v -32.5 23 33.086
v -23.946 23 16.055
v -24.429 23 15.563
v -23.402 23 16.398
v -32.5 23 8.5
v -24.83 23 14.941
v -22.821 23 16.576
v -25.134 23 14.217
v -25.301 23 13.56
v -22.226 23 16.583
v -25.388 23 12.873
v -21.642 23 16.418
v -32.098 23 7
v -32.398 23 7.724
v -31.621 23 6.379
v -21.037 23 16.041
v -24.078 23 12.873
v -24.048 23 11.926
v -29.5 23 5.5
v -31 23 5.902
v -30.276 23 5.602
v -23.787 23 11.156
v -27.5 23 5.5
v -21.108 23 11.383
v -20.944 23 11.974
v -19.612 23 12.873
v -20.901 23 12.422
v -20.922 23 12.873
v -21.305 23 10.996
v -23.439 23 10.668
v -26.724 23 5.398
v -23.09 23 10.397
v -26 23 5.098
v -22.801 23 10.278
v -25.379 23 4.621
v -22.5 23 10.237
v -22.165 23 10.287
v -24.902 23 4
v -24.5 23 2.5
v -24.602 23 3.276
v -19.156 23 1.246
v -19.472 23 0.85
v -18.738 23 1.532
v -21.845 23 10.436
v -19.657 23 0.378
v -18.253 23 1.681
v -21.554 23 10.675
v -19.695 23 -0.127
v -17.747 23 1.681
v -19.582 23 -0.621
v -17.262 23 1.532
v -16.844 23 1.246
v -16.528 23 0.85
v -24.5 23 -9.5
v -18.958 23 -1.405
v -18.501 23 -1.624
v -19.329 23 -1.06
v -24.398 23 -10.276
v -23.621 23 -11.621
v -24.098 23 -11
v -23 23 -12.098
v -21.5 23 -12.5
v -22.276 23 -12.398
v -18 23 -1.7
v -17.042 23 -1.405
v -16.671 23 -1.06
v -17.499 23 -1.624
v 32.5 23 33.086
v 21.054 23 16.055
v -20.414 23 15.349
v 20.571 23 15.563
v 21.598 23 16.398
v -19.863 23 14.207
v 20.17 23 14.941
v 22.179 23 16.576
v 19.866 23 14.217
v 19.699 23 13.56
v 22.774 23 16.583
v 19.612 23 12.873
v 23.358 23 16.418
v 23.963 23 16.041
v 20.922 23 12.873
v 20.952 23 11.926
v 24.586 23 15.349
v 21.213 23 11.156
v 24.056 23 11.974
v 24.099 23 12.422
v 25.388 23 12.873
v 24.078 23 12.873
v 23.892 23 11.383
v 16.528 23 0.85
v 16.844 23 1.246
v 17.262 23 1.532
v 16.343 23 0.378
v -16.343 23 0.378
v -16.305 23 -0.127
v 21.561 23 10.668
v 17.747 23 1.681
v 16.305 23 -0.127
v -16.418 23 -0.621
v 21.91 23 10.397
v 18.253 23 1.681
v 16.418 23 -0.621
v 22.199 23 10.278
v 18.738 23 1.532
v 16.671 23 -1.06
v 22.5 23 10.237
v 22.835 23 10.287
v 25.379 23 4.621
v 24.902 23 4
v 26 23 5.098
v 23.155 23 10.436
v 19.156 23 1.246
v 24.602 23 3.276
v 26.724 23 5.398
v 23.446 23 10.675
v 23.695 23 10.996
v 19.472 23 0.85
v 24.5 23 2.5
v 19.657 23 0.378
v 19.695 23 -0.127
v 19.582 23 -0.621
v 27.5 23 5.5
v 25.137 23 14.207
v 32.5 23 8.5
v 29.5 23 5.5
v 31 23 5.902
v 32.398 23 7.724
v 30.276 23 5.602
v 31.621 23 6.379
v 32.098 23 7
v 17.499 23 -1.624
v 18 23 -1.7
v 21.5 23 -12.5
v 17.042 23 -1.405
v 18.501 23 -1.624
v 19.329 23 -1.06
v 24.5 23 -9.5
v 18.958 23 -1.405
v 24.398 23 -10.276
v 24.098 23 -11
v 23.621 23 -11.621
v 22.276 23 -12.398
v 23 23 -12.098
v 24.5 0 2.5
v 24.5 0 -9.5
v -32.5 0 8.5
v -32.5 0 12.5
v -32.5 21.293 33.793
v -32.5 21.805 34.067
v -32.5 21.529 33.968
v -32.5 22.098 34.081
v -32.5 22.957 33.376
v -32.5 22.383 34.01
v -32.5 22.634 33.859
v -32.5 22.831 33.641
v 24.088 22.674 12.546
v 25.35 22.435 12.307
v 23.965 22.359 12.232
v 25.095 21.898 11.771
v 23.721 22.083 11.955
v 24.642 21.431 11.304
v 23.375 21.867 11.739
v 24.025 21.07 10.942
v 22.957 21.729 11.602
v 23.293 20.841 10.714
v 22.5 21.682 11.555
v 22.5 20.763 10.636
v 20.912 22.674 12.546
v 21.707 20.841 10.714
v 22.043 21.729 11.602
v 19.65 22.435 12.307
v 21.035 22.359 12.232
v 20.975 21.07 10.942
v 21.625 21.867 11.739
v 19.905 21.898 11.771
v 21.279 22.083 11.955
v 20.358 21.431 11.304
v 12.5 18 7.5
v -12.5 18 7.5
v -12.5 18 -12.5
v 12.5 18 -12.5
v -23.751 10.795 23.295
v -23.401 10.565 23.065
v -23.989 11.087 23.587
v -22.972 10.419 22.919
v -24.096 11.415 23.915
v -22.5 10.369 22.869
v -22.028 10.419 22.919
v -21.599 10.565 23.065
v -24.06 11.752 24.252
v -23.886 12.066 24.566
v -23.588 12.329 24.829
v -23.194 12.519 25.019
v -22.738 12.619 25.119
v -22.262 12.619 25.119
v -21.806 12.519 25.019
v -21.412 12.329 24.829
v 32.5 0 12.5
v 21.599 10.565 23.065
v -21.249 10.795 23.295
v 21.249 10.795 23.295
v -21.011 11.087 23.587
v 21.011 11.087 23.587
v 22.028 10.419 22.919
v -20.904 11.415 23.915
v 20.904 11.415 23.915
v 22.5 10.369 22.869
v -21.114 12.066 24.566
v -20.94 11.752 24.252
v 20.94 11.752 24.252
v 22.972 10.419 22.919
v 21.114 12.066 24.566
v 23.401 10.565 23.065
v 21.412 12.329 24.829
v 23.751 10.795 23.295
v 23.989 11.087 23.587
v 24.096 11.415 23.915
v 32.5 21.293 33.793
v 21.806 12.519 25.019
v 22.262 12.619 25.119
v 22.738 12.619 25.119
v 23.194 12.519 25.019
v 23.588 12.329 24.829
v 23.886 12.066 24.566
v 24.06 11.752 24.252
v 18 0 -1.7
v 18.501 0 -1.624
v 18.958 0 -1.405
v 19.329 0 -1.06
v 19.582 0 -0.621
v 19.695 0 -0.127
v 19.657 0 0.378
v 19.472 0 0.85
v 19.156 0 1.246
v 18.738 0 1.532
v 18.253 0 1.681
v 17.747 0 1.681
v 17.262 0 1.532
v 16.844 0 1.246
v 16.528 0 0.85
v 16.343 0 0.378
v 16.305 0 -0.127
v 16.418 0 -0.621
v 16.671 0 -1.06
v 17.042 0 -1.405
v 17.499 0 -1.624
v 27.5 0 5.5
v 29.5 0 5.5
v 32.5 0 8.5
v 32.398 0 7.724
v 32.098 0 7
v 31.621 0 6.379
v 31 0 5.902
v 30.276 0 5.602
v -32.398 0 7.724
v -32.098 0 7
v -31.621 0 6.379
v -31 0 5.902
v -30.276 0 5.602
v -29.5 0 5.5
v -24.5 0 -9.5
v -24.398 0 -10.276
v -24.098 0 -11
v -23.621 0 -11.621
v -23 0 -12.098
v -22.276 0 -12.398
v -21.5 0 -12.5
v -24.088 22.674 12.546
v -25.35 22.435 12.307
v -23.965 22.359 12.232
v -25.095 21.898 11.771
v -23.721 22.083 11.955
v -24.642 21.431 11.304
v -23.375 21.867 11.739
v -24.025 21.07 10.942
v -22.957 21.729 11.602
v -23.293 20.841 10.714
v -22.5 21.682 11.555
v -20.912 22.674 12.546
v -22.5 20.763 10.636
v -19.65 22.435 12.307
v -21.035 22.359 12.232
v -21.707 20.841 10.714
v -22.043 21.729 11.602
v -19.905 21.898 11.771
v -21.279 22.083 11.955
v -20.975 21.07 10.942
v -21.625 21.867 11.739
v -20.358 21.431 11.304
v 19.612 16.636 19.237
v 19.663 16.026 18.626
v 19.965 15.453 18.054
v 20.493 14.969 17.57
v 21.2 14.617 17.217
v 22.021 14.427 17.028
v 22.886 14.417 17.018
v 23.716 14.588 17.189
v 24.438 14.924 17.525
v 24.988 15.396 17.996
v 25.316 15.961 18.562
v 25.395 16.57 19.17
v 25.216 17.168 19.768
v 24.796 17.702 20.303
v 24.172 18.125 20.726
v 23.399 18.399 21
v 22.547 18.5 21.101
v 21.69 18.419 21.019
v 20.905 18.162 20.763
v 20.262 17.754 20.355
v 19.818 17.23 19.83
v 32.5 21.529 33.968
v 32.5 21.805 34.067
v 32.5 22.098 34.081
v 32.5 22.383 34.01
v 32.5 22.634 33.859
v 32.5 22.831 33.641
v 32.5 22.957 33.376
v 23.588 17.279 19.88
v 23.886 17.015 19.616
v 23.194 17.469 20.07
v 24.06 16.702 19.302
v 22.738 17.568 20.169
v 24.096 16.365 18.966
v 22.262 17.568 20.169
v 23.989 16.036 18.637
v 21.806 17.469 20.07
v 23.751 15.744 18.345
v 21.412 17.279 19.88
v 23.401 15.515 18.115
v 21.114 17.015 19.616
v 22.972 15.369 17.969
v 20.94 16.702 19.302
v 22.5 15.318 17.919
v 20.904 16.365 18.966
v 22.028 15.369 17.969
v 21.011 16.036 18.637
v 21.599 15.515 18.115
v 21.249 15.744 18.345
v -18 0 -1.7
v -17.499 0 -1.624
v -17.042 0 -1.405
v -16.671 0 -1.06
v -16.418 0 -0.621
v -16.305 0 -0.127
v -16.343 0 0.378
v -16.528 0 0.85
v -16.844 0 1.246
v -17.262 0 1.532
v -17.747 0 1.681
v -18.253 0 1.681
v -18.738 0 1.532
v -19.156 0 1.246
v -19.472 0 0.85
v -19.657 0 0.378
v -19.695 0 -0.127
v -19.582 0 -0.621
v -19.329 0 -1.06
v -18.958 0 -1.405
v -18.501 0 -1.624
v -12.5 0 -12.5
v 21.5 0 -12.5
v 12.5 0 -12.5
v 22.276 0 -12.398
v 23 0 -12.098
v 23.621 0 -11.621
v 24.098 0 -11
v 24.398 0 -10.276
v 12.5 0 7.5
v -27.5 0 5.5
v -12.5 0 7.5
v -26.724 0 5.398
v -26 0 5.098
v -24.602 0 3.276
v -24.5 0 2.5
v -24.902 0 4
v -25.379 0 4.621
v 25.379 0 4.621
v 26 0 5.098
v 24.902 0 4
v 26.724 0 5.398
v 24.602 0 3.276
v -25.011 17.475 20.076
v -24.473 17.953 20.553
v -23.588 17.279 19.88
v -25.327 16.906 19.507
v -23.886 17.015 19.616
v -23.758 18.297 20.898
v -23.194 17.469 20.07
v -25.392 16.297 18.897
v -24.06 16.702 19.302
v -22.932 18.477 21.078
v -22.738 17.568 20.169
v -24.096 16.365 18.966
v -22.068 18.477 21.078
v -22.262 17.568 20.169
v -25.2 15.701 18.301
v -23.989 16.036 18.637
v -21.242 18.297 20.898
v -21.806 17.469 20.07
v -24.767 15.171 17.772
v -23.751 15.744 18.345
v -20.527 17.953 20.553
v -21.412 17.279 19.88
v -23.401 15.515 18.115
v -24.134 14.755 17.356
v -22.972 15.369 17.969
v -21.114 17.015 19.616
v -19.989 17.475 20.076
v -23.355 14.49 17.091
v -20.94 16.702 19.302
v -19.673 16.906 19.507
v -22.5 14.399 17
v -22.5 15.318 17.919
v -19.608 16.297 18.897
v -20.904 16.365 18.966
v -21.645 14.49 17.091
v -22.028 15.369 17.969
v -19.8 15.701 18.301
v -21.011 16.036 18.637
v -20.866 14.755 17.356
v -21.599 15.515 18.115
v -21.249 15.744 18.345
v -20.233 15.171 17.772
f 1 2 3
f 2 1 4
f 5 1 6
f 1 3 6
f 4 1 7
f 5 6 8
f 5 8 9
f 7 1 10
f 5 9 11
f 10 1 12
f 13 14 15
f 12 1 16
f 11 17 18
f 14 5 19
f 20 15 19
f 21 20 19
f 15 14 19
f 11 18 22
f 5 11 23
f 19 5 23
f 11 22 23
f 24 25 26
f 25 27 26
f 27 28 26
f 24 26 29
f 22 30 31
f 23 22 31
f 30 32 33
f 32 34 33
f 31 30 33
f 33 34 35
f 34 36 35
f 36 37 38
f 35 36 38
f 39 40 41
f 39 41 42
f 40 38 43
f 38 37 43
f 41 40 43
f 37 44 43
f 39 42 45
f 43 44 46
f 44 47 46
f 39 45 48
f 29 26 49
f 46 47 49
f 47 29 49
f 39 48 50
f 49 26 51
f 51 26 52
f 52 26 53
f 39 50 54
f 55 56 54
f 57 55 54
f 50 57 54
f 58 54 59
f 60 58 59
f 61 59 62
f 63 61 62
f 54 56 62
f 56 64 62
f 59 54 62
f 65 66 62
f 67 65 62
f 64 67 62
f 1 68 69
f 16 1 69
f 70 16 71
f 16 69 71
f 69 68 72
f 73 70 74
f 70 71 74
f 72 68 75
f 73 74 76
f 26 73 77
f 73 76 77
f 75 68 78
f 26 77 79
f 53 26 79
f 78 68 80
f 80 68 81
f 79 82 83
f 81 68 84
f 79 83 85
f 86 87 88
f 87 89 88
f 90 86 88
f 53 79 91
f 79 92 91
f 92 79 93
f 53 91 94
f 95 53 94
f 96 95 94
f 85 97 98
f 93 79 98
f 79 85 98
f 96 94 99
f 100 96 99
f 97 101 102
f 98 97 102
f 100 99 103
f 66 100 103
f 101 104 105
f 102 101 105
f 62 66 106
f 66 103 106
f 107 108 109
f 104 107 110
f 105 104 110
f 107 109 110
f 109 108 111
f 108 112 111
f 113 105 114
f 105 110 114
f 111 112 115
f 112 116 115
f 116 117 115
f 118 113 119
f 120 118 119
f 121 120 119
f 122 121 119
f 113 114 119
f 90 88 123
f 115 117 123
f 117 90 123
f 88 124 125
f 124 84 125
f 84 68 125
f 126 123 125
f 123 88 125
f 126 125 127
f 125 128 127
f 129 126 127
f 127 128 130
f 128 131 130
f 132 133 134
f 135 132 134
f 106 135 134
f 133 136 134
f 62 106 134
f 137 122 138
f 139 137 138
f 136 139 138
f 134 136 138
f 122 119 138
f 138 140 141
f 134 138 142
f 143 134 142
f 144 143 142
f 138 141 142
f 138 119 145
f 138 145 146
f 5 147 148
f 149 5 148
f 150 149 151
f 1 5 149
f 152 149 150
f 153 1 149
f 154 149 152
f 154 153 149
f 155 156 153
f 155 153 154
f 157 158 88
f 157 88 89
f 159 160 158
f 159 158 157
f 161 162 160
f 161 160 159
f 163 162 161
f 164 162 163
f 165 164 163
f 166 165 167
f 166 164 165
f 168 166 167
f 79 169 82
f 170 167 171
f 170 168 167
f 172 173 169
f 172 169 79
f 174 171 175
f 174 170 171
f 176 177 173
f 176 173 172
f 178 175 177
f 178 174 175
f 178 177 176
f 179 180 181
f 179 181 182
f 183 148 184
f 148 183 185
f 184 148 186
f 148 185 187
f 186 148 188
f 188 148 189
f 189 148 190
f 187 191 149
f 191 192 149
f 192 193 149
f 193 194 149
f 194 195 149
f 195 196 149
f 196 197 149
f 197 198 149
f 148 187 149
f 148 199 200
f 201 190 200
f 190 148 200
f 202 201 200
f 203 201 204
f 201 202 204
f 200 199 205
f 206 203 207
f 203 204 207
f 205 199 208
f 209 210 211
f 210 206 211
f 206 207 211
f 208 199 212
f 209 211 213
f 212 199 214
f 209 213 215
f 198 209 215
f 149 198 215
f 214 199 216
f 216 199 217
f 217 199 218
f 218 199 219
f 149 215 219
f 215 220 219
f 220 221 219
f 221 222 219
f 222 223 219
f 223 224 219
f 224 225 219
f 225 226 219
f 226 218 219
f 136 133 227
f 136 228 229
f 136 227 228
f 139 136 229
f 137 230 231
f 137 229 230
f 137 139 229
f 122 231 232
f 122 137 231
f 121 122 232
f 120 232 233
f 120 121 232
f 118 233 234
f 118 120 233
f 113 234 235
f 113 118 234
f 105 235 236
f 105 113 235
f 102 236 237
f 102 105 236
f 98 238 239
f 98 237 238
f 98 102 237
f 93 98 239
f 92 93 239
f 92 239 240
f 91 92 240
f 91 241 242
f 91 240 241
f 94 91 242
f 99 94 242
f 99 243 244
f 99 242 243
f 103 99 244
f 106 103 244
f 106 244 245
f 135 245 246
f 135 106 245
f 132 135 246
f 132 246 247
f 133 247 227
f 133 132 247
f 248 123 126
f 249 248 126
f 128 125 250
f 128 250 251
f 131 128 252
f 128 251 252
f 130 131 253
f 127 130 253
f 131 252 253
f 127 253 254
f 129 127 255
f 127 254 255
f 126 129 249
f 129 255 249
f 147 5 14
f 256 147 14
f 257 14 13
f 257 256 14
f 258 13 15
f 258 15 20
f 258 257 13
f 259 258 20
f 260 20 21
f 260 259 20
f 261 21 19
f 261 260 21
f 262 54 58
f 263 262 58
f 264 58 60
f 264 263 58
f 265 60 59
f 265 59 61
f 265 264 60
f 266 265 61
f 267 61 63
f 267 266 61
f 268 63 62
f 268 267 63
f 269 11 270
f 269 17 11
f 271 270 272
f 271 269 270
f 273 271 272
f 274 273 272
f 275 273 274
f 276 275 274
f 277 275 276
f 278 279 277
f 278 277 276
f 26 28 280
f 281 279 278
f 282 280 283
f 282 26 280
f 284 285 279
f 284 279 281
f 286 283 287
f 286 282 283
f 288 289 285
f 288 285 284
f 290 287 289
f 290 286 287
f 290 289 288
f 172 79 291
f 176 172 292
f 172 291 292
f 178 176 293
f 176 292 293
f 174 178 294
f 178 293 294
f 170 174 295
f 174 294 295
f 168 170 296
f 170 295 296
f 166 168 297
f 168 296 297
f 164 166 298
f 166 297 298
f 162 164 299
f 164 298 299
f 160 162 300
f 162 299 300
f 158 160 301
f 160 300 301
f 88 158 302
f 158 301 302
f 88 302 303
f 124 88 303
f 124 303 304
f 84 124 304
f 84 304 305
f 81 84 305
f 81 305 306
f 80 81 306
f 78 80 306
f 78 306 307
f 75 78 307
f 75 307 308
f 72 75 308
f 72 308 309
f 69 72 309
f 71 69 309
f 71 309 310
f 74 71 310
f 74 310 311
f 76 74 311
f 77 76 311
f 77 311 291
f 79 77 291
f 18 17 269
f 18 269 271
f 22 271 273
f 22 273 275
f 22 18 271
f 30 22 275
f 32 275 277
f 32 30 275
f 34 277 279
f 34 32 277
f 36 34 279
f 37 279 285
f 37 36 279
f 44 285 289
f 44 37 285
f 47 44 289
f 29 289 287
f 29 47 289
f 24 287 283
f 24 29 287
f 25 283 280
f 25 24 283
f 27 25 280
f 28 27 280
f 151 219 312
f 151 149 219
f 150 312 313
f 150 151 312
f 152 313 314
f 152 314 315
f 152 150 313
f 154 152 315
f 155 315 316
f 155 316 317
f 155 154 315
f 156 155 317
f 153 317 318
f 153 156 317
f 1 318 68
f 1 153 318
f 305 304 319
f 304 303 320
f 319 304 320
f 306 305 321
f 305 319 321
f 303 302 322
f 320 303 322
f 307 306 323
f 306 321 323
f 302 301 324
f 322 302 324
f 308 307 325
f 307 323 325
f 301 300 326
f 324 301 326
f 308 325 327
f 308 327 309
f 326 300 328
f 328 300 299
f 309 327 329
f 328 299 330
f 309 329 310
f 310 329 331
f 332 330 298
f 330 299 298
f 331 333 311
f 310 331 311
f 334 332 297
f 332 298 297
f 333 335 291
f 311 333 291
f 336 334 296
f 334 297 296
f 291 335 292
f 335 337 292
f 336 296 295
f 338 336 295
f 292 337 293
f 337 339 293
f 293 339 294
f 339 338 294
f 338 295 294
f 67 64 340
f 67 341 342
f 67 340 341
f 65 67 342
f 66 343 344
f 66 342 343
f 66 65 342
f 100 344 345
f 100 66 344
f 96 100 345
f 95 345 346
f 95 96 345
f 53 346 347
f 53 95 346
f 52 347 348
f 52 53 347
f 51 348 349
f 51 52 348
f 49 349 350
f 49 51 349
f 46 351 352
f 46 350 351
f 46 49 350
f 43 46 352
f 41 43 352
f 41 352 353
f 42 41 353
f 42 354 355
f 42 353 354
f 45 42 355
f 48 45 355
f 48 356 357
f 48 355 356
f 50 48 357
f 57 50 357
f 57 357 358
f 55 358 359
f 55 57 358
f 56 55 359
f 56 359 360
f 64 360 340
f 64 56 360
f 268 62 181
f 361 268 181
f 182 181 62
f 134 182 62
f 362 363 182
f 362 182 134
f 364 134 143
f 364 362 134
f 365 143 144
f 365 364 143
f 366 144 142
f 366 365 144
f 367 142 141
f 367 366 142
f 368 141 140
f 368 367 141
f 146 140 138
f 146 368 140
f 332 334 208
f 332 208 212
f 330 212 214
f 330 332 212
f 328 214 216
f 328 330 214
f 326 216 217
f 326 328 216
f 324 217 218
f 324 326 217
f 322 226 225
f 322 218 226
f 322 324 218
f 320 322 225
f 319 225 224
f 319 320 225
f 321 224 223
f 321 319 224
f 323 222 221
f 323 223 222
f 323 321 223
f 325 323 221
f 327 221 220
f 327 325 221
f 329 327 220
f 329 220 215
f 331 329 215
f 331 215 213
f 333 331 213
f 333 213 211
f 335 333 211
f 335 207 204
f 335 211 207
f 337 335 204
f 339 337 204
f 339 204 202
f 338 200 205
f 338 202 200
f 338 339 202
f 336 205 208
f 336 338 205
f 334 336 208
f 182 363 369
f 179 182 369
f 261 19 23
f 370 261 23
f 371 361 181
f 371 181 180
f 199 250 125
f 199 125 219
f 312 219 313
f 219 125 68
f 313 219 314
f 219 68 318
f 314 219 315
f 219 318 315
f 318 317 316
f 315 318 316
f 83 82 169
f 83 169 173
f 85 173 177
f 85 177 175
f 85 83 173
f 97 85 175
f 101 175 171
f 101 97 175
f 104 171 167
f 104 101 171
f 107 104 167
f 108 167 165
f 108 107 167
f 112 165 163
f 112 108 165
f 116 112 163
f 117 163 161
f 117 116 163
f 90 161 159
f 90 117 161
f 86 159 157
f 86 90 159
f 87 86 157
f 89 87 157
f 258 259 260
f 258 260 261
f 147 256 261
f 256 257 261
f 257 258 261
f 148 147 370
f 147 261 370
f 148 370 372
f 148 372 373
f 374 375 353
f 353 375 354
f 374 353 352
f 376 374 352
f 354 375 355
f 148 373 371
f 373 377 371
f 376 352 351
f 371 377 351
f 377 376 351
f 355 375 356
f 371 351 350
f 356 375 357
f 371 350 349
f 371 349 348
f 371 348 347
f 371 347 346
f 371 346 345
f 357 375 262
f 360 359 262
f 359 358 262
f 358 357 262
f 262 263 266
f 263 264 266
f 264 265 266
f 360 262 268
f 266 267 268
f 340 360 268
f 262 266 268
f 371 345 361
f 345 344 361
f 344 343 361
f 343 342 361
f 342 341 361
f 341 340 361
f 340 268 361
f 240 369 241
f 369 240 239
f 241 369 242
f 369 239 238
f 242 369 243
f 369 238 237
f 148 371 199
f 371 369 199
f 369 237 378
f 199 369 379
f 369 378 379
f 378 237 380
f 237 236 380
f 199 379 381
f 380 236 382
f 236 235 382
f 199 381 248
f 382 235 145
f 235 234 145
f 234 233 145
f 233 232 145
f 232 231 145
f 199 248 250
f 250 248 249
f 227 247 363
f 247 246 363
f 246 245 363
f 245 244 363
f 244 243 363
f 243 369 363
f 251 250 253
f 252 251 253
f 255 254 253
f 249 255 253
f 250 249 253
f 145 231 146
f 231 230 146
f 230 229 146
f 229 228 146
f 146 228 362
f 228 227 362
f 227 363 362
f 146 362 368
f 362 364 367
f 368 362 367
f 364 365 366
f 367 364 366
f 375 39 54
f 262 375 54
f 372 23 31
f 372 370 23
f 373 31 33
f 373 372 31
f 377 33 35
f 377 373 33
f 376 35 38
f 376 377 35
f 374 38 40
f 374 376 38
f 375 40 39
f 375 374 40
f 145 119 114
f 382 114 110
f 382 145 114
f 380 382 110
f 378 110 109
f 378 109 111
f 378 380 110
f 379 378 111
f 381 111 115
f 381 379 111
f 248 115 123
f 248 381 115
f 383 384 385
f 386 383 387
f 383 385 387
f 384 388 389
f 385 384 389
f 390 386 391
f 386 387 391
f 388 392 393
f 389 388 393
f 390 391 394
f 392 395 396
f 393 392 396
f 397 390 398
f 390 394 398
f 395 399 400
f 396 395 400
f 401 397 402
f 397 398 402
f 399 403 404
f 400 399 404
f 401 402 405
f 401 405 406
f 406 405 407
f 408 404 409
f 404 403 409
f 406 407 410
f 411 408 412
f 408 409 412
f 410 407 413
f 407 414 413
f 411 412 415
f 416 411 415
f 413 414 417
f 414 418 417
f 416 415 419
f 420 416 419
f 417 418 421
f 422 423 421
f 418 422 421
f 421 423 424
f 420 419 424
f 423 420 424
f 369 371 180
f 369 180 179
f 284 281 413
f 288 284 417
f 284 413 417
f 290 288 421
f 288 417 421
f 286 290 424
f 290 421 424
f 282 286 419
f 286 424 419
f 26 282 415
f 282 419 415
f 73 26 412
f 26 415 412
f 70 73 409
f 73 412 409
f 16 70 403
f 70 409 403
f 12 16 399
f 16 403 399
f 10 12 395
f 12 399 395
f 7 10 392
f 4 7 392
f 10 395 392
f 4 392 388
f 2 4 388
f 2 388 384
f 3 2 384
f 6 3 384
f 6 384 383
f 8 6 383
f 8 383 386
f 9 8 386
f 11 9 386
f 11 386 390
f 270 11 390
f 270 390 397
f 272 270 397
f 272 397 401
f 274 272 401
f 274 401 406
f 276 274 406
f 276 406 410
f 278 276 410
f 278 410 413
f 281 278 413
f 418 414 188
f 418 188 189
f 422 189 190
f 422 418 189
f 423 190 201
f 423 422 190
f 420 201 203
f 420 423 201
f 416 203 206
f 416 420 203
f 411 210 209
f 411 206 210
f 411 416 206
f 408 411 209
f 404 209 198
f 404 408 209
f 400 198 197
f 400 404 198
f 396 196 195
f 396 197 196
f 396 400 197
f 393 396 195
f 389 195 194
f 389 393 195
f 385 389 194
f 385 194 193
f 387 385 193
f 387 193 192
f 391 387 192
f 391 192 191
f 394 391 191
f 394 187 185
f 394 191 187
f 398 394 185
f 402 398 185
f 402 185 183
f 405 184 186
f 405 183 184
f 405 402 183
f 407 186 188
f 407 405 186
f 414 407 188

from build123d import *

# Parameters (mm, degrees)
SKETCH_1_W               = 65
SKETCH_1_H               = 25
EXTRUDE_1_DEPTH          = 23
EXTRUDE_2_DEPTH          = 65
SKETCH_3_W               = 25
SKETCH_3_H               = 20
CUT_EXTRUDE_1_DEPTH      = 18
CUT_EXTRUDE_2_DEPTH      = 53.605845683
CUT_EXTRUDE_2_DEPTH_BACK = 53.605845683
SKETCH_4_R               = 1.6
CUT_EXTRUDE_START        = -7
SKETCH_5_R               = 2.9
CUT_EXTRUDE_3_DEPTH      = 9
CUT_EXTRUDE_4_DEPTH      = 54.343228249
CUT_EXTRUDE_4_DEPTH_BACK = 54.343228249
SKETCH_6_R               = 1.7
FILLET_1_R               = 1
SKETCH_7_W               = 8
SKETCH_7_H               = 18
CUT_EXTRUDE_5_DEPTH      = 40
FILLET_2_R               = 3


with BuildPart() as part:
    # 草图1 → 凸台-拉伸1 (new body)
    with BuildSketch(Plane(origin=(0, 0, 0), x_dir=(1, 0, 0), z_dir=(0, 1, 0))):
        Rectangle(SKETCH_1_W, SKETCH_1_H)
    extrude(amount=EXTRUDE_1_DEPTH)

    # 草图2 → 凸台-拉伸2 (add)
    with BuildSketch(Plane(origin=(32.5, 0, 0), x_dir=(0, 0, -1), z_dir=(1, 0, 0))):
        Polygon((-12.5, 0), (-35.5, 23), (-12.5, 23), align=None)
    extrude(amount=-EXTRUDE_2_DEPTH)

    # 草图3 → 切除-拉伸1 (cut)
    with BuildSketch(Plane.XZ):
        with Locations((0, -2.5)):
            Rectangle(SKETCH_3_W, SKETCH_3_H)
    extrude(amount=-CUT_EXTRUDE_1_DEPTH, mode=Mode.SUBTRACT)

    # 草图4 → 切除-拉伸2 (cut, two sides: drawn at the far end of the back side and taken through both)
    with BuildSketch(Plane(origin=(0, -6.25, 6.25), x_dir=(1, 0, 0), z_dir=(0, -0.7071067811865489, 0.7071067811865462)).offset(-CUT_EXTRUDE_2_DEPTH_BACK)):
        with Locations(Location((-22.5, 25.102290732, 0), (0, 0, 270))):
            Circle(SKETCH_4_R)
        with Locations(Location((22.5, 25.102290732, 0), (0, 0, 270))):
            Circle(SKETCH_4_R)
    extrude(amount=CUT_EXTRUDE_2_DEPTH + CUT_EXTRUDE_2_DEPTH_BACK, mode=Mode.SUBTRACT)

    # 草图5 → 切除-拉伸3 (cut)
    with BuildSketch(Plane(origin=(0, -6.25, 6.25), x_dir=(1, 0, 0), z_dir=(0, -0.7071067811865489, 0.7071067811865462)).offset(CUT_EXTRUDE_START)):
        with Locations(Location((-22.5, 25.102290732, 0), (0, 0, 270))):
            Circle(SKETCH_5_R)
        with Locations(Location((22.5, 25.102290732, 0), (0, 0, 174.787670359))):
            Circle(SKETCH_5_R)
    extrude(amount=-CUT_EXTRUDE_3_DEPTH, mode=Mode.SUBTRACT)

    # 草图6 → 切除-拉伸4 (cut, two sides: drawn at the far end of the back side and taken through both)
    with BuildSketch(Plane.XZ.offset(-CUT_EXTRUDE_4_DEPTH_BACK)):
        with Locations(Location((-18, 0, 0), (0, 0, 270))):
            Circle(SKETCH_6_R)
        with Locations(Location((18, 0, 0), (0, 0, 270))):
            Circle(SKETCH_6_R)
    extrude(amount=CUT_EXTRUDE_4_DEPTH + CUT_EXTRUDE_4_DEPTH_BACK, mode=Mode.SUBTRACT)

    # 圆角1
    fillet_1_edges = [part.edges().sort_by_distance(p)[0] for p in [
        (0, 23, 35.5),
    ]]
    fillet(fillet_1_edges, radius=FILLET_1_R)

    # 草图7 → 切除-拉伸5 (cut)
    with BuildSketch(Plane(origin=(0, 23, 0), x_dir=(1, 0, 0), z_dir=(0, 1, 0))):
        with Locations((-28.5, 3.5)):
            Rectangle(SKETCH_7_W, SKETCH_7_H)
        with Locations((28.5, 3.5)):
            Rectangle(SKETCH_7_W, SKETCH_7_H)
    extrude(amount=-CUT_EXTRUDE_5_DEPTH, mode=Mode.SUBTRACT)

    # 圆角2
    fillet_2_edges = [part.edges().sort_by_distance(p)[0] for p in [
        (-32.5, 11.5, 5.5),
        (-24.5, 11.5, -12.5),
        (-24.5, 11.5, 5.5),
        (24.5, 11.5, -12.5),
        (32.5, 11.5, 5.5),
        (24.5, 11.5, 5.5),
    ]]
    fillet(fillet_2_edges, radius=FILLET_2_R)


solid = part.part
